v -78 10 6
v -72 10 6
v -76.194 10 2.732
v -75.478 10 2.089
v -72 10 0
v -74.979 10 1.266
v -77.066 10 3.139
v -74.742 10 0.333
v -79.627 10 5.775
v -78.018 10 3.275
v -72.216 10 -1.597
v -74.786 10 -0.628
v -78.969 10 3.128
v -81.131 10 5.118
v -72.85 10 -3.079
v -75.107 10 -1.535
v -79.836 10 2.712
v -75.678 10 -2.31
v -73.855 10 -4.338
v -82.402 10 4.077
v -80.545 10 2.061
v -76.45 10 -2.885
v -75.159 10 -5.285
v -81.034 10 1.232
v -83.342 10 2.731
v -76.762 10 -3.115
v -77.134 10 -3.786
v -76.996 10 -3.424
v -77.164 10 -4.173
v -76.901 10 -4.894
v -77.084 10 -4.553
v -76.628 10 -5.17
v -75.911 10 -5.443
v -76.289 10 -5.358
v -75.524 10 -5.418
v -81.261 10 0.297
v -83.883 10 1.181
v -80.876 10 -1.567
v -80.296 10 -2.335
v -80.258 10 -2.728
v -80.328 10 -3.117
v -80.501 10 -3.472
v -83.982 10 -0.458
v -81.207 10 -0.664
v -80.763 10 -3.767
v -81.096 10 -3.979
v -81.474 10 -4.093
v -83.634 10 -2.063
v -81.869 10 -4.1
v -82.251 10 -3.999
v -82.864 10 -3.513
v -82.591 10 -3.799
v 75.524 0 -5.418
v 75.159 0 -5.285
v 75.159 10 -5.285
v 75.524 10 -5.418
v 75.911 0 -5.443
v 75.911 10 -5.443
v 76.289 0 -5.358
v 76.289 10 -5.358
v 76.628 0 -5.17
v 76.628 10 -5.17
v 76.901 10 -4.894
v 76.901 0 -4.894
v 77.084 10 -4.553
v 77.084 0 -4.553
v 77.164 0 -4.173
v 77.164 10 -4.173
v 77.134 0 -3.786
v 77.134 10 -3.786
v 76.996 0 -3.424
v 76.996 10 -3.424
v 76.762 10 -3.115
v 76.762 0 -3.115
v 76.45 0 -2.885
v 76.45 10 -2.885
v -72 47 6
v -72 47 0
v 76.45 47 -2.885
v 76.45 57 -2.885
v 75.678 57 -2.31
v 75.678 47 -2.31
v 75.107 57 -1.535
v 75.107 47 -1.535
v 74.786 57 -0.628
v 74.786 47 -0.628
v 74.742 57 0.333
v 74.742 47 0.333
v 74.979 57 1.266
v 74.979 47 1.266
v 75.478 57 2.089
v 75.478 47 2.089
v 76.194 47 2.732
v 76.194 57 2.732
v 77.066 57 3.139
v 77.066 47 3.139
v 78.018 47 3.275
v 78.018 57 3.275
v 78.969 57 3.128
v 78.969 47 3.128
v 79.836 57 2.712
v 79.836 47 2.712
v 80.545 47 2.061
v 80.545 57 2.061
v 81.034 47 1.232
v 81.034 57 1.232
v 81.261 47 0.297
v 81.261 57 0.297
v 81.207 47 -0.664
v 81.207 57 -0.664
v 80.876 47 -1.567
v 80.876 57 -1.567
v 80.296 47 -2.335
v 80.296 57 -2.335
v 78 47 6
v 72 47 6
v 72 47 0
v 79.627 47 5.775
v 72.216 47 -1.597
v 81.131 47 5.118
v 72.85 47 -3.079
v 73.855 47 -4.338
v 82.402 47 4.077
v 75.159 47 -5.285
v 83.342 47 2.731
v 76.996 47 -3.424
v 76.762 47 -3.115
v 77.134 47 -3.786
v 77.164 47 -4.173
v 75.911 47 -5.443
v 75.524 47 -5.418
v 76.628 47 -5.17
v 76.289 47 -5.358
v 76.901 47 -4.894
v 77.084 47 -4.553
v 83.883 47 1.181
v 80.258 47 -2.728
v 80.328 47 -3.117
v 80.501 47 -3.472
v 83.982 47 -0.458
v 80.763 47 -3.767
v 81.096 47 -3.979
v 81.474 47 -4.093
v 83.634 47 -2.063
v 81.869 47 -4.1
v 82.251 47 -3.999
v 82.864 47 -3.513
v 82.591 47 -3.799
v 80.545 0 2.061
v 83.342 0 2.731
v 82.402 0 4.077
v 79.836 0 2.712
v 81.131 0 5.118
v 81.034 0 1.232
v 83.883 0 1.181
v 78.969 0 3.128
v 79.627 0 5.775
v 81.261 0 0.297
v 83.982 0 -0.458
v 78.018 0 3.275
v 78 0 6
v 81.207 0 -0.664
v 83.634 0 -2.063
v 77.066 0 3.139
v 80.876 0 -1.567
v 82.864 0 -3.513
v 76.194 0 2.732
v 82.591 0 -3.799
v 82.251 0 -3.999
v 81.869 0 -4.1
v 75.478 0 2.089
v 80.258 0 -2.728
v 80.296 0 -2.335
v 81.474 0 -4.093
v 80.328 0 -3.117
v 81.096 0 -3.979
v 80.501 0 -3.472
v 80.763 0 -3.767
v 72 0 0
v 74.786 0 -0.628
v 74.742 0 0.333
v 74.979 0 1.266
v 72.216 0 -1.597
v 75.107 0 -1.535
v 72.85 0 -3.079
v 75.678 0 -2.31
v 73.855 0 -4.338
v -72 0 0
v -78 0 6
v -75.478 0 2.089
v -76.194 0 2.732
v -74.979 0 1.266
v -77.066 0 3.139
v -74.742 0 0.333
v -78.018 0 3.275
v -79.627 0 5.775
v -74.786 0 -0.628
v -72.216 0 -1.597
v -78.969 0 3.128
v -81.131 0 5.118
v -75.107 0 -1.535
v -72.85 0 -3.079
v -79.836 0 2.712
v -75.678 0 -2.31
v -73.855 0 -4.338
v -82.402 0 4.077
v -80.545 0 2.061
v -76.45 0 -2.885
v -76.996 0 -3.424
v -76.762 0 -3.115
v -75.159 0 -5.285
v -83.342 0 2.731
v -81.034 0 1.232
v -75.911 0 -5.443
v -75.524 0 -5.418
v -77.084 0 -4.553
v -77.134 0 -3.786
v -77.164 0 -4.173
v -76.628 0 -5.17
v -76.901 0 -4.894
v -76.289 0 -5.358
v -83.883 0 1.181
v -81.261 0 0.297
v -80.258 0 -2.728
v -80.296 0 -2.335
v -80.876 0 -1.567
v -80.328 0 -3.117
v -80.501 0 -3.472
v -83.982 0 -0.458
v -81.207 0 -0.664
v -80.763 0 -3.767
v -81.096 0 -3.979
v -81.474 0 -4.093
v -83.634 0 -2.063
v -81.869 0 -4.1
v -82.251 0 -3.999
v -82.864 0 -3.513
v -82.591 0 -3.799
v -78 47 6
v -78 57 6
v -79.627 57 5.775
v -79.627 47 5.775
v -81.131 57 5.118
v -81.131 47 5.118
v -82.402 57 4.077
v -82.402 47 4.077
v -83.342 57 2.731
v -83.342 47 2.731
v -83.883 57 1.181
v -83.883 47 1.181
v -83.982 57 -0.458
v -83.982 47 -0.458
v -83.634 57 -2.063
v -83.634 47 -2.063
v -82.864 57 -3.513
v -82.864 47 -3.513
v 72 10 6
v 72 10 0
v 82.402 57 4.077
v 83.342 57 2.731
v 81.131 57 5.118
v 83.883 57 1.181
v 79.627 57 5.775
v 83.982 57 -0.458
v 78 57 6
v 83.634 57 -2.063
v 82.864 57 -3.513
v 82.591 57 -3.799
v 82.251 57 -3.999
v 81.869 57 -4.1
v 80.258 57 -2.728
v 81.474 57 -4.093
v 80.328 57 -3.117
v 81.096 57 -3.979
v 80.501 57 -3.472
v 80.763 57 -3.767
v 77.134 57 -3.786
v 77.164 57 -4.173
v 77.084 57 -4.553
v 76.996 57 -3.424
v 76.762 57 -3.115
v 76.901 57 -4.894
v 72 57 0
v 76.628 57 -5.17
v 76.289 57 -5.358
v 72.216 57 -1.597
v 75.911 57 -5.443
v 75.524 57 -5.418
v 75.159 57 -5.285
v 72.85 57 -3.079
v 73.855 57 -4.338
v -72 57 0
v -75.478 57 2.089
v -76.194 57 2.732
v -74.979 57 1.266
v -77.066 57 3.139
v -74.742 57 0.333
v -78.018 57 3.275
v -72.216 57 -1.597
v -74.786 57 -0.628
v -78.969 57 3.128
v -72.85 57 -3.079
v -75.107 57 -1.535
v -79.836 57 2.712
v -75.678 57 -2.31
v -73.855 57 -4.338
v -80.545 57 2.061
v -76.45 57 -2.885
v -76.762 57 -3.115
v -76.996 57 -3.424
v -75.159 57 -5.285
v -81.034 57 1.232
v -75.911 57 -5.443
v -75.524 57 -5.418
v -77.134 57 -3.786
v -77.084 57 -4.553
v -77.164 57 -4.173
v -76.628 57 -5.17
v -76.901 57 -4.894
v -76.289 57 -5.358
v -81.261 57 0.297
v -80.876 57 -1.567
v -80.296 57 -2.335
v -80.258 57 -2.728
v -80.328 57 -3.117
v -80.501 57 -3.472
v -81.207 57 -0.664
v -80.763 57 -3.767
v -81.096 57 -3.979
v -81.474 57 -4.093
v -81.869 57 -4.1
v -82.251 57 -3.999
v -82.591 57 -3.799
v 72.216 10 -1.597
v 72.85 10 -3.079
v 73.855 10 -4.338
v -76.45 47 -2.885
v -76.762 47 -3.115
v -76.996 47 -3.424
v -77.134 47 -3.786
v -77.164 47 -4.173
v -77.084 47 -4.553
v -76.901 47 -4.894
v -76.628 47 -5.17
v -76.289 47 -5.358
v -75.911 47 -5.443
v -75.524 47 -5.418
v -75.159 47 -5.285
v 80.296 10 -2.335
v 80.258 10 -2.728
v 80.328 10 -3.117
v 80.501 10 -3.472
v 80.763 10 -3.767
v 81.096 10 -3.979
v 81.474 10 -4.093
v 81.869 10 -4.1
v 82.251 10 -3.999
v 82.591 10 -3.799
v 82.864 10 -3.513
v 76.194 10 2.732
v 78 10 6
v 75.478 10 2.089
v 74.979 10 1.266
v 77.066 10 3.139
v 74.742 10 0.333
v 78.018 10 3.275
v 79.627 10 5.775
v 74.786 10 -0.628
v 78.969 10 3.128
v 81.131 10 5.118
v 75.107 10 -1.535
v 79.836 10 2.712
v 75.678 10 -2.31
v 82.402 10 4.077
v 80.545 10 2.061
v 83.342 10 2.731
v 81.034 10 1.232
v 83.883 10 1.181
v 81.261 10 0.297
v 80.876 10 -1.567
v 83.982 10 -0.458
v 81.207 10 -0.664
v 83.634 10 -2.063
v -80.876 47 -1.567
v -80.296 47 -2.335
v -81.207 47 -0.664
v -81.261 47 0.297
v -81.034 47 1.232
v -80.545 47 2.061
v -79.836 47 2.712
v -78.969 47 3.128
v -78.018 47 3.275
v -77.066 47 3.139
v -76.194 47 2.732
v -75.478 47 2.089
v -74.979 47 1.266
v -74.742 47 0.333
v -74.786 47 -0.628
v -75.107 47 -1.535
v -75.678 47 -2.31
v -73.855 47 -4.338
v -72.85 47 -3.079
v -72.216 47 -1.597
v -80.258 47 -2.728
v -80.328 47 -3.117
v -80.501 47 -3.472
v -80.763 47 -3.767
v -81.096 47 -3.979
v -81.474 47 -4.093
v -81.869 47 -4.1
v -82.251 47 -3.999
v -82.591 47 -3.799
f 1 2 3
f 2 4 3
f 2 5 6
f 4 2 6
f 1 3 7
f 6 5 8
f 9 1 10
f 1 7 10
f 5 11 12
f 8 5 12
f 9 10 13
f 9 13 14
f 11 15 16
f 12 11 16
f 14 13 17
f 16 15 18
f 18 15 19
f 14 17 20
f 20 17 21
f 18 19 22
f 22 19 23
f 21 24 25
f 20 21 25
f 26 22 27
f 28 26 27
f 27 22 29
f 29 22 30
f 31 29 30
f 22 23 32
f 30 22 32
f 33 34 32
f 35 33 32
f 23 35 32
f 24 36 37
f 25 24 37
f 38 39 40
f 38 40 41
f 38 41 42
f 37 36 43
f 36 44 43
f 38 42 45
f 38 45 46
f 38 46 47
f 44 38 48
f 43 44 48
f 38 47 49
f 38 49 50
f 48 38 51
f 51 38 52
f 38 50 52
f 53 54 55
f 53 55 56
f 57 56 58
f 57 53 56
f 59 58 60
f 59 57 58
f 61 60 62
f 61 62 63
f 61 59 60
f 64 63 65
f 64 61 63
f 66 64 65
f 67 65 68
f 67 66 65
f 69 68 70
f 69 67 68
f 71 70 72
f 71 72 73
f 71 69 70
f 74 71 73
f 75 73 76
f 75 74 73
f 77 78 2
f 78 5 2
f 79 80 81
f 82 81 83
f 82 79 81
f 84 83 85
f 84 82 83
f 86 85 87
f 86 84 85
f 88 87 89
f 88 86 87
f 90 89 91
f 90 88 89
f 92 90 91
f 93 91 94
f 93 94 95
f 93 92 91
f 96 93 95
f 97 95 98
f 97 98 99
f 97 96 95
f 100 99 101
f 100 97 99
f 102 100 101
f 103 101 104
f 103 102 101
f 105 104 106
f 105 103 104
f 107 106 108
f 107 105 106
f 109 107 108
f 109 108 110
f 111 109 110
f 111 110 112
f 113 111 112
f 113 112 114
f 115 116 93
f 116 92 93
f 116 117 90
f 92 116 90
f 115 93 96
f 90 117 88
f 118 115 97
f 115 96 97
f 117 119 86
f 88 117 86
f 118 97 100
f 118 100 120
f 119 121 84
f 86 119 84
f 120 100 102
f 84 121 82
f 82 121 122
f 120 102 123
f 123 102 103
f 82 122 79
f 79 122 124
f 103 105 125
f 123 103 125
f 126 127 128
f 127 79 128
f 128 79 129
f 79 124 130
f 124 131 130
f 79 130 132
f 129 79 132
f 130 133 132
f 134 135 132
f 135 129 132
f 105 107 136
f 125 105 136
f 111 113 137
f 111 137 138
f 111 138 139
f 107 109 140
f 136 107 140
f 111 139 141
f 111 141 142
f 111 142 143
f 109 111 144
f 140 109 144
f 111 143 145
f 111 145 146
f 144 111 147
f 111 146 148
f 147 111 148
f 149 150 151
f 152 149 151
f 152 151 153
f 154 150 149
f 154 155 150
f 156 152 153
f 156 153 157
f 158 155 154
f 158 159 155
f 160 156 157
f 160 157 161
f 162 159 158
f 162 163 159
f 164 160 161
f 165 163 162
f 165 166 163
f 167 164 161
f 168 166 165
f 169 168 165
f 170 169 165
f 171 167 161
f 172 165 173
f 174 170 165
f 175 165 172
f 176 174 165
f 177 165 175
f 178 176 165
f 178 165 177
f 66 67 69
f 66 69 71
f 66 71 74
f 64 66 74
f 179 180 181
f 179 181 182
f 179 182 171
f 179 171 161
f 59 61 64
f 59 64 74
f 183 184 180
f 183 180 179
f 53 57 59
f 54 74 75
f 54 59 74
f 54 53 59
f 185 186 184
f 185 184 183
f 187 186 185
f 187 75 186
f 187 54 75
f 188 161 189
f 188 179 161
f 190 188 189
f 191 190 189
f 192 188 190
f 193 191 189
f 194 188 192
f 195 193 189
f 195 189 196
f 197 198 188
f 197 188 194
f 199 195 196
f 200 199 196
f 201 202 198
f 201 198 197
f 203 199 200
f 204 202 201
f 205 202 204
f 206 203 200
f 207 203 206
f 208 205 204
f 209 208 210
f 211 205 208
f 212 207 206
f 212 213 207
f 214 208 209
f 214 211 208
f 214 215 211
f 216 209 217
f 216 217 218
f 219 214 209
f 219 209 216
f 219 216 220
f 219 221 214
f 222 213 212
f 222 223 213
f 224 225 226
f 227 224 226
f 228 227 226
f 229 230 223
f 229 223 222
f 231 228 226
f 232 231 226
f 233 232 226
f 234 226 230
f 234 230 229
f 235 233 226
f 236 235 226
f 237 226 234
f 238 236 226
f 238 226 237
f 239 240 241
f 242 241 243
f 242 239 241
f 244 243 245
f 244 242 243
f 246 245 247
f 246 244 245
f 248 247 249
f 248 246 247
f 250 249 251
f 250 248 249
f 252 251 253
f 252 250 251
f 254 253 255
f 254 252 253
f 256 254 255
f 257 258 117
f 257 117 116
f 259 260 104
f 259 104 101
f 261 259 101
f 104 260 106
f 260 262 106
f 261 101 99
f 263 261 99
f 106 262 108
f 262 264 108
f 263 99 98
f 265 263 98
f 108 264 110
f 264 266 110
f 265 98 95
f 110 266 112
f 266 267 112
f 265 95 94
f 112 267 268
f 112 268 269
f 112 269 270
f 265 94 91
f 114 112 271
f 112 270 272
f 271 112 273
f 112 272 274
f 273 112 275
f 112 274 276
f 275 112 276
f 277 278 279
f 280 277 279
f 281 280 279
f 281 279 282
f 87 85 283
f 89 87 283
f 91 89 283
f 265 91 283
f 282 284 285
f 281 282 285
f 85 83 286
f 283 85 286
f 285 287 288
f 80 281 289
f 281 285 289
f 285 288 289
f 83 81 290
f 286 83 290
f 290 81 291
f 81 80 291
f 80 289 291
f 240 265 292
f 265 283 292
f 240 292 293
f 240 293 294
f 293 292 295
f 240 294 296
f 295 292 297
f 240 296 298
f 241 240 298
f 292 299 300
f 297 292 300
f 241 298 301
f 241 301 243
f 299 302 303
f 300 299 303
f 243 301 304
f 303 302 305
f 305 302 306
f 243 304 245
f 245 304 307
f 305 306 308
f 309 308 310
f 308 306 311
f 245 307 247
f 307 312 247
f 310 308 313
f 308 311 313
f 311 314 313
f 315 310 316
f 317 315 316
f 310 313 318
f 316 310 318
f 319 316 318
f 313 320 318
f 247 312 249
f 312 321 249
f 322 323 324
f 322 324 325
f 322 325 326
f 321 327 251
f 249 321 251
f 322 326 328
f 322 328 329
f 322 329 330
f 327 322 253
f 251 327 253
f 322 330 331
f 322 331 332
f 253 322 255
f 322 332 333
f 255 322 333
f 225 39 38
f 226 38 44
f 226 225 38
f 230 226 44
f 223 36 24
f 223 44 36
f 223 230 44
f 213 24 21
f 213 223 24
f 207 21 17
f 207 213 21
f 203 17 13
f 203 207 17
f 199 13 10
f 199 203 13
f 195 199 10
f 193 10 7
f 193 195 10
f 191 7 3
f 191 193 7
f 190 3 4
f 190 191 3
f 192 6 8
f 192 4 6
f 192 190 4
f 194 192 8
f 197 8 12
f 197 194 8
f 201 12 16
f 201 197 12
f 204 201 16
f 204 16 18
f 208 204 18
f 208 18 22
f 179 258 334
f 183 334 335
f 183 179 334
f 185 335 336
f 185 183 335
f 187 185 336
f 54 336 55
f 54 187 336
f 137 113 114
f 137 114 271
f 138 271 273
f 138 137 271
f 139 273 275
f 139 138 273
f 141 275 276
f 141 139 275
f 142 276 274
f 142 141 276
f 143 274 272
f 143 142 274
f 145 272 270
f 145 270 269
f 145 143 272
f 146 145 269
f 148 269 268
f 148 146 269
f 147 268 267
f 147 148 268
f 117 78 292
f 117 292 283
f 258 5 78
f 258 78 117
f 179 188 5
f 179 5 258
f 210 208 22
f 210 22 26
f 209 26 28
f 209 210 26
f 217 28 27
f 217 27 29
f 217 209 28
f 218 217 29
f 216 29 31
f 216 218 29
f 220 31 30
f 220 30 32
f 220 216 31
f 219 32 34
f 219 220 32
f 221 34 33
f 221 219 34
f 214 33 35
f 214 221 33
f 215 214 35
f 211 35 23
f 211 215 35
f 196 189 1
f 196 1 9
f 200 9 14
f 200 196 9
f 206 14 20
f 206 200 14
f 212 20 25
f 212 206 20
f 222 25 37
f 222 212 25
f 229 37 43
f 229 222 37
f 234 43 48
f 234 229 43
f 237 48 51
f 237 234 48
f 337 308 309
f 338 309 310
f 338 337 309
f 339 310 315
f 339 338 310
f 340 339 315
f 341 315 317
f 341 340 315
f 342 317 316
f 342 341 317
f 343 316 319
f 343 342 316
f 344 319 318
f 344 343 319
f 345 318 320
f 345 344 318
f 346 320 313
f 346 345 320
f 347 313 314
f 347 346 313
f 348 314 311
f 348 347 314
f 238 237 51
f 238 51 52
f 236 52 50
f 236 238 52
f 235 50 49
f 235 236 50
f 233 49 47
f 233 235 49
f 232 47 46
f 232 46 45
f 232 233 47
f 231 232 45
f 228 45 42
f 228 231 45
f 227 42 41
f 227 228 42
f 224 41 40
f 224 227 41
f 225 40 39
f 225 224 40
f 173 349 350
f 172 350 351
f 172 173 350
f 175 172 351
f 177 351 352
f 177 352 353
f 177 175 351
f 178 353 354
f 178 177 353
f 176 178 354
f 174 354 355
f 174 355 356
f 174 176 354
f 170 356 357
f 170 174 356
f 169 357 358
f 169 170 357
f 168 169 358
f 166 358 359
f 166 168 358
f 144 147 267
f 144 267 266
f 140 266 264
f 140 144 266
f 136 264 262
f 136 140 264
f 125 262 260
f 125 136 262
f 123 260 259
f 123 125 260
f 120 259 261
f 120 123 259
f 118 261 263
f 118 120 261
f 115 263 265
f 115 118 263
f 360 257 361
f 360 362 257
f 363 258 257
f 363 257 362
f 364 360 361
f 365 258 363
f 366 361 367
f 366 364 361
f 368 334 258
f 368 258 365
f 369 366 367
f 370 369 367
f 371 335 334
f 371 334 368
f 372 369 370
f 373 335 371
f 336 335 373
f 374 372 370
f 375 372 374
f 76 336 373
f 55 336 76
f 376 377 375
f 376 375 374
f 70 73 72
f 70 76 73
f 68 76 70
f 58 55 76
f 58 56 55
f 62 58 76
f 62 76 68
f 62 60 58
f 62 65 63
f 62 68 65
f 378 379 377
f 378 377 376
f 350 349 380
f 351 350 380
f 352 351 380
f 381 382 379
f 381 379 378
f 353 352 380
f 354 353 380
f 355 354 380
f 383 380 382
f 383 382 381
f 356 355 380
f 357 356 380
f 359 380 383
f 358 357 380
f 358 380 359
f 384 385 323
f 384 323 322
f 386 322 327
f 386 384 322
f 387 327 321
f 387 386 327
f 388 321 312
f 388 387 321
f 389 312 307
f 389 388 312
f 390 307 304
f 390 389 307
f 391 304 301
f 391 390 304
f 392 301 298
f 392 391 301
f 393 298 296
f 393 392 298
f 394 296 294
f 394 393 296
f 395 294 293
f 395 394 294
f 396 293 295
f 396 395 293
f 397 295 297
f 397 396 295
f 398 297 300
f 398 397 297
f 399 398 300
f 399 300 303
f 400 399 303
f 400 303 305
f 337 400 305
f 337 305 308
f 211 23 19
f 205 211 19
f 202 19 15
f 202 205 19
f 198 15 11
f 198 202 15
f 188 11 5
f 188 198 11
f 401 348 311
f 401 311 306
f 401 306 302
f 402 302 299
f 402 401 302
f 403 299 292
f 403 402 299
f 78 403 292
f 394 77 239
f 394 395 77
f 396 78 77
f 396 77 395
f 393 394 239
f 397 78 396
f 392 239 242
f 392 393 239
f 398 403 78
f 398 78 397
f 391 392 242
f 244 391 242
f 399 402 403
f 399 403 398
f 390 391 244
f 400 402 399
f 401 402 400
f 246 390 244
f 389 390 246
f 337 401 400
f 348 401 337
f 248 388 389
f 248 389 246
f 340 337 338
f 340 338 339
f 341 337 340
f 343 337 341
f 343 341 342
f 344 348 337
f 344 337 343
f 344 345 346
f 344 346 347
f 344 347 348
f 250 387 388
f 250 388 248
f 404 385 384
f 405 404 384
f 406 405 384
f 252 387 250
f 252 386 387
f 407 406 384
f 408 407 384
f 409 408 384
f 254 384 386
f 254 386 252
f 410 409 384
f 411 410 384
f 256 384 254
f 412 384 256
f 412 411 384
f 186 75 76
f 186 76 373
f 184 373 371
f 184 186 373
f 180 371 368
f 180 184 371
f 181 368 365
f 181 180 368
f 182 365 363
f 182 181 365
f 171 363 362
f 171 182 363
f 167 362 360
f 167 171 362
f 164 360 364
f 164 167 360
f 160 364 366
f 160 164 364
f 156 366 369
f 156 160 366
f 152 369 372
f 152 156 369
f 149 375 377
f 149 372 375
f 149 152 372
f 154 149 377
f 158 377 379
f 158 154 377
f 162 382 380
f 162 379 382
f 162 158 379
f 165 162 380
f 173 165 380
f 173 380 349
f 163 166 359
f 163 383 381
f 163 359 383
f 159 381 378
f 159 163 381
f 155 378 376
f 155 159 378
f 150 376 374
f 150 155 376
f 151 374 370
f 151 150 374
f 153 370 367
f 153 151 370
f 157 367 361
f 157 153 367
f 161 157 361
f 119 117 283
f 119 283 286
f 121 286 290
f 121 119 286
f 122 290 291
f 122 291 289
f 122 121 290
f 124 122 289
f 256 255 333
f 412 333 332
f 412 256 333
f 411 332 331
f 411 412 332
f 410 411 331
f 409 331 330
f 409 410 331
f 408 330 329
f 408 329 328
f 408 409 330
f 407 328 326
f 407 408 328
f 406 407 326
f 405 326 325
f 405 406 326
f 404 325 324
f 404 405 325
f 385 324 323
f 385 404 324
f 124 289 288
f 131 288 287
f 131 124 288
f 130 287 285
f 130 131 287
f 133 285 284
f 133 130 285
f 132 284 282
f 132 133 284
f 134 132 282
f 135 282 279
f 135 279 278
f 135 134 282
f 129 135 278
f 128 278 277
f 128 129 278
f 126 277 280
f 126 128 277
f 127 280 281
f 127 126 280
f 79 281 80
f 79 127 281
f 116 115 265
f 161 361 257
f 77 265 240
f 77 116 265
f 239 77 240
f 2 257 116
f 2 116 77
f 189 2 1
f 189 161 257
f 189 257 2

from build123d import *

# Parameters (mm, degrees)
RESSALTO_EXTRUS_O1_DEPTH = 57
CORTE_EXTRUS_O1_DEPTH    = 18.5


with BuildPart() as part:
    # Esboço1 → Ressalto-extrusão1 (new body)
    with BuildSketch(Plane(origin=(0, 0, 0), x_dir=(1, 0, 0), z_dir=(0, 1, 0))):
        with BuildLine():
            Line((-72, 0), (72, 0))
            ThreePointArc((72, 0), (72.85009345, 3.078711179), (75.159487509, 5.285024956))
            ThreePointArc((75.159487509, 5.285024956), (77.004661638, 4.729916917), (76.449553599, 2.884742789))
            ThreePointArc((76.449553599, 2.884742789), (77.536782743, -3.242075689), (80.296246294, 2.335139815))
            ThreePointArc((80.296246294, 2.335139815), (81.096189798, 3.978813584), (82.863892701, 3.513196237))
            ThreePointArc((82.863892701, 3.513196237), (83.342245662, -2.731375348), (78, -6))
            Line((78, -6), (-78, -6))
            ThreePointArc((-78, -6), (-83.342245662, -2.731375348), (-82.863892701, 3.513196237))
            ThreePointArc((-82.863892701, 3.513196237), (-81.096189798, 3.978813584), (-80.296246294, 2.335139815))
            ThreePointArc((-80.296246294, 2.335139815), (-77.536782743, -3.242075689), (-76.449553599, 2.884742789))
            ThreePointArc((-76.449553599, 2.884742789), (-77.004661638, 4.729916917), (-75.159487509, 5.285024956))
            ThreePointArc((-75.159487509, 5.285024956), (-72.85009345, 3.078711179), (-72, 0))
        make_face()
    extrude(amount=RESSALTO_EXTRUS_O1_DEPTH)

    # Esboço3 → Corte-extrusão1 (cut, symmetric)
    with BuildSketch(Plane(origin=(0, 28.5, 0), x_dir=(1, 0, 0), z_dir=(0, 1, 0))):
        with BuildLine():
            Line((-72, 0), (-72, -6))
            Line((-72, -6), (-78, -6))
            ThreePointArc((-78, -6), (-82.242640687, 4.242640687), (-72, 0))
        make_face()
        with BuildLine():
            Line((72, 0), (72, -6))
            Line((72, -6), (78, -6))
            ThreePointArc((78, -6), (82.242640687, 4.242640687), (72, 0))
        make_face()
    extrude(amount=CORTE_EXTRUS_O1_DEPTH, both=True, mode=Mode.SUBTRACT)


solid = part.part
